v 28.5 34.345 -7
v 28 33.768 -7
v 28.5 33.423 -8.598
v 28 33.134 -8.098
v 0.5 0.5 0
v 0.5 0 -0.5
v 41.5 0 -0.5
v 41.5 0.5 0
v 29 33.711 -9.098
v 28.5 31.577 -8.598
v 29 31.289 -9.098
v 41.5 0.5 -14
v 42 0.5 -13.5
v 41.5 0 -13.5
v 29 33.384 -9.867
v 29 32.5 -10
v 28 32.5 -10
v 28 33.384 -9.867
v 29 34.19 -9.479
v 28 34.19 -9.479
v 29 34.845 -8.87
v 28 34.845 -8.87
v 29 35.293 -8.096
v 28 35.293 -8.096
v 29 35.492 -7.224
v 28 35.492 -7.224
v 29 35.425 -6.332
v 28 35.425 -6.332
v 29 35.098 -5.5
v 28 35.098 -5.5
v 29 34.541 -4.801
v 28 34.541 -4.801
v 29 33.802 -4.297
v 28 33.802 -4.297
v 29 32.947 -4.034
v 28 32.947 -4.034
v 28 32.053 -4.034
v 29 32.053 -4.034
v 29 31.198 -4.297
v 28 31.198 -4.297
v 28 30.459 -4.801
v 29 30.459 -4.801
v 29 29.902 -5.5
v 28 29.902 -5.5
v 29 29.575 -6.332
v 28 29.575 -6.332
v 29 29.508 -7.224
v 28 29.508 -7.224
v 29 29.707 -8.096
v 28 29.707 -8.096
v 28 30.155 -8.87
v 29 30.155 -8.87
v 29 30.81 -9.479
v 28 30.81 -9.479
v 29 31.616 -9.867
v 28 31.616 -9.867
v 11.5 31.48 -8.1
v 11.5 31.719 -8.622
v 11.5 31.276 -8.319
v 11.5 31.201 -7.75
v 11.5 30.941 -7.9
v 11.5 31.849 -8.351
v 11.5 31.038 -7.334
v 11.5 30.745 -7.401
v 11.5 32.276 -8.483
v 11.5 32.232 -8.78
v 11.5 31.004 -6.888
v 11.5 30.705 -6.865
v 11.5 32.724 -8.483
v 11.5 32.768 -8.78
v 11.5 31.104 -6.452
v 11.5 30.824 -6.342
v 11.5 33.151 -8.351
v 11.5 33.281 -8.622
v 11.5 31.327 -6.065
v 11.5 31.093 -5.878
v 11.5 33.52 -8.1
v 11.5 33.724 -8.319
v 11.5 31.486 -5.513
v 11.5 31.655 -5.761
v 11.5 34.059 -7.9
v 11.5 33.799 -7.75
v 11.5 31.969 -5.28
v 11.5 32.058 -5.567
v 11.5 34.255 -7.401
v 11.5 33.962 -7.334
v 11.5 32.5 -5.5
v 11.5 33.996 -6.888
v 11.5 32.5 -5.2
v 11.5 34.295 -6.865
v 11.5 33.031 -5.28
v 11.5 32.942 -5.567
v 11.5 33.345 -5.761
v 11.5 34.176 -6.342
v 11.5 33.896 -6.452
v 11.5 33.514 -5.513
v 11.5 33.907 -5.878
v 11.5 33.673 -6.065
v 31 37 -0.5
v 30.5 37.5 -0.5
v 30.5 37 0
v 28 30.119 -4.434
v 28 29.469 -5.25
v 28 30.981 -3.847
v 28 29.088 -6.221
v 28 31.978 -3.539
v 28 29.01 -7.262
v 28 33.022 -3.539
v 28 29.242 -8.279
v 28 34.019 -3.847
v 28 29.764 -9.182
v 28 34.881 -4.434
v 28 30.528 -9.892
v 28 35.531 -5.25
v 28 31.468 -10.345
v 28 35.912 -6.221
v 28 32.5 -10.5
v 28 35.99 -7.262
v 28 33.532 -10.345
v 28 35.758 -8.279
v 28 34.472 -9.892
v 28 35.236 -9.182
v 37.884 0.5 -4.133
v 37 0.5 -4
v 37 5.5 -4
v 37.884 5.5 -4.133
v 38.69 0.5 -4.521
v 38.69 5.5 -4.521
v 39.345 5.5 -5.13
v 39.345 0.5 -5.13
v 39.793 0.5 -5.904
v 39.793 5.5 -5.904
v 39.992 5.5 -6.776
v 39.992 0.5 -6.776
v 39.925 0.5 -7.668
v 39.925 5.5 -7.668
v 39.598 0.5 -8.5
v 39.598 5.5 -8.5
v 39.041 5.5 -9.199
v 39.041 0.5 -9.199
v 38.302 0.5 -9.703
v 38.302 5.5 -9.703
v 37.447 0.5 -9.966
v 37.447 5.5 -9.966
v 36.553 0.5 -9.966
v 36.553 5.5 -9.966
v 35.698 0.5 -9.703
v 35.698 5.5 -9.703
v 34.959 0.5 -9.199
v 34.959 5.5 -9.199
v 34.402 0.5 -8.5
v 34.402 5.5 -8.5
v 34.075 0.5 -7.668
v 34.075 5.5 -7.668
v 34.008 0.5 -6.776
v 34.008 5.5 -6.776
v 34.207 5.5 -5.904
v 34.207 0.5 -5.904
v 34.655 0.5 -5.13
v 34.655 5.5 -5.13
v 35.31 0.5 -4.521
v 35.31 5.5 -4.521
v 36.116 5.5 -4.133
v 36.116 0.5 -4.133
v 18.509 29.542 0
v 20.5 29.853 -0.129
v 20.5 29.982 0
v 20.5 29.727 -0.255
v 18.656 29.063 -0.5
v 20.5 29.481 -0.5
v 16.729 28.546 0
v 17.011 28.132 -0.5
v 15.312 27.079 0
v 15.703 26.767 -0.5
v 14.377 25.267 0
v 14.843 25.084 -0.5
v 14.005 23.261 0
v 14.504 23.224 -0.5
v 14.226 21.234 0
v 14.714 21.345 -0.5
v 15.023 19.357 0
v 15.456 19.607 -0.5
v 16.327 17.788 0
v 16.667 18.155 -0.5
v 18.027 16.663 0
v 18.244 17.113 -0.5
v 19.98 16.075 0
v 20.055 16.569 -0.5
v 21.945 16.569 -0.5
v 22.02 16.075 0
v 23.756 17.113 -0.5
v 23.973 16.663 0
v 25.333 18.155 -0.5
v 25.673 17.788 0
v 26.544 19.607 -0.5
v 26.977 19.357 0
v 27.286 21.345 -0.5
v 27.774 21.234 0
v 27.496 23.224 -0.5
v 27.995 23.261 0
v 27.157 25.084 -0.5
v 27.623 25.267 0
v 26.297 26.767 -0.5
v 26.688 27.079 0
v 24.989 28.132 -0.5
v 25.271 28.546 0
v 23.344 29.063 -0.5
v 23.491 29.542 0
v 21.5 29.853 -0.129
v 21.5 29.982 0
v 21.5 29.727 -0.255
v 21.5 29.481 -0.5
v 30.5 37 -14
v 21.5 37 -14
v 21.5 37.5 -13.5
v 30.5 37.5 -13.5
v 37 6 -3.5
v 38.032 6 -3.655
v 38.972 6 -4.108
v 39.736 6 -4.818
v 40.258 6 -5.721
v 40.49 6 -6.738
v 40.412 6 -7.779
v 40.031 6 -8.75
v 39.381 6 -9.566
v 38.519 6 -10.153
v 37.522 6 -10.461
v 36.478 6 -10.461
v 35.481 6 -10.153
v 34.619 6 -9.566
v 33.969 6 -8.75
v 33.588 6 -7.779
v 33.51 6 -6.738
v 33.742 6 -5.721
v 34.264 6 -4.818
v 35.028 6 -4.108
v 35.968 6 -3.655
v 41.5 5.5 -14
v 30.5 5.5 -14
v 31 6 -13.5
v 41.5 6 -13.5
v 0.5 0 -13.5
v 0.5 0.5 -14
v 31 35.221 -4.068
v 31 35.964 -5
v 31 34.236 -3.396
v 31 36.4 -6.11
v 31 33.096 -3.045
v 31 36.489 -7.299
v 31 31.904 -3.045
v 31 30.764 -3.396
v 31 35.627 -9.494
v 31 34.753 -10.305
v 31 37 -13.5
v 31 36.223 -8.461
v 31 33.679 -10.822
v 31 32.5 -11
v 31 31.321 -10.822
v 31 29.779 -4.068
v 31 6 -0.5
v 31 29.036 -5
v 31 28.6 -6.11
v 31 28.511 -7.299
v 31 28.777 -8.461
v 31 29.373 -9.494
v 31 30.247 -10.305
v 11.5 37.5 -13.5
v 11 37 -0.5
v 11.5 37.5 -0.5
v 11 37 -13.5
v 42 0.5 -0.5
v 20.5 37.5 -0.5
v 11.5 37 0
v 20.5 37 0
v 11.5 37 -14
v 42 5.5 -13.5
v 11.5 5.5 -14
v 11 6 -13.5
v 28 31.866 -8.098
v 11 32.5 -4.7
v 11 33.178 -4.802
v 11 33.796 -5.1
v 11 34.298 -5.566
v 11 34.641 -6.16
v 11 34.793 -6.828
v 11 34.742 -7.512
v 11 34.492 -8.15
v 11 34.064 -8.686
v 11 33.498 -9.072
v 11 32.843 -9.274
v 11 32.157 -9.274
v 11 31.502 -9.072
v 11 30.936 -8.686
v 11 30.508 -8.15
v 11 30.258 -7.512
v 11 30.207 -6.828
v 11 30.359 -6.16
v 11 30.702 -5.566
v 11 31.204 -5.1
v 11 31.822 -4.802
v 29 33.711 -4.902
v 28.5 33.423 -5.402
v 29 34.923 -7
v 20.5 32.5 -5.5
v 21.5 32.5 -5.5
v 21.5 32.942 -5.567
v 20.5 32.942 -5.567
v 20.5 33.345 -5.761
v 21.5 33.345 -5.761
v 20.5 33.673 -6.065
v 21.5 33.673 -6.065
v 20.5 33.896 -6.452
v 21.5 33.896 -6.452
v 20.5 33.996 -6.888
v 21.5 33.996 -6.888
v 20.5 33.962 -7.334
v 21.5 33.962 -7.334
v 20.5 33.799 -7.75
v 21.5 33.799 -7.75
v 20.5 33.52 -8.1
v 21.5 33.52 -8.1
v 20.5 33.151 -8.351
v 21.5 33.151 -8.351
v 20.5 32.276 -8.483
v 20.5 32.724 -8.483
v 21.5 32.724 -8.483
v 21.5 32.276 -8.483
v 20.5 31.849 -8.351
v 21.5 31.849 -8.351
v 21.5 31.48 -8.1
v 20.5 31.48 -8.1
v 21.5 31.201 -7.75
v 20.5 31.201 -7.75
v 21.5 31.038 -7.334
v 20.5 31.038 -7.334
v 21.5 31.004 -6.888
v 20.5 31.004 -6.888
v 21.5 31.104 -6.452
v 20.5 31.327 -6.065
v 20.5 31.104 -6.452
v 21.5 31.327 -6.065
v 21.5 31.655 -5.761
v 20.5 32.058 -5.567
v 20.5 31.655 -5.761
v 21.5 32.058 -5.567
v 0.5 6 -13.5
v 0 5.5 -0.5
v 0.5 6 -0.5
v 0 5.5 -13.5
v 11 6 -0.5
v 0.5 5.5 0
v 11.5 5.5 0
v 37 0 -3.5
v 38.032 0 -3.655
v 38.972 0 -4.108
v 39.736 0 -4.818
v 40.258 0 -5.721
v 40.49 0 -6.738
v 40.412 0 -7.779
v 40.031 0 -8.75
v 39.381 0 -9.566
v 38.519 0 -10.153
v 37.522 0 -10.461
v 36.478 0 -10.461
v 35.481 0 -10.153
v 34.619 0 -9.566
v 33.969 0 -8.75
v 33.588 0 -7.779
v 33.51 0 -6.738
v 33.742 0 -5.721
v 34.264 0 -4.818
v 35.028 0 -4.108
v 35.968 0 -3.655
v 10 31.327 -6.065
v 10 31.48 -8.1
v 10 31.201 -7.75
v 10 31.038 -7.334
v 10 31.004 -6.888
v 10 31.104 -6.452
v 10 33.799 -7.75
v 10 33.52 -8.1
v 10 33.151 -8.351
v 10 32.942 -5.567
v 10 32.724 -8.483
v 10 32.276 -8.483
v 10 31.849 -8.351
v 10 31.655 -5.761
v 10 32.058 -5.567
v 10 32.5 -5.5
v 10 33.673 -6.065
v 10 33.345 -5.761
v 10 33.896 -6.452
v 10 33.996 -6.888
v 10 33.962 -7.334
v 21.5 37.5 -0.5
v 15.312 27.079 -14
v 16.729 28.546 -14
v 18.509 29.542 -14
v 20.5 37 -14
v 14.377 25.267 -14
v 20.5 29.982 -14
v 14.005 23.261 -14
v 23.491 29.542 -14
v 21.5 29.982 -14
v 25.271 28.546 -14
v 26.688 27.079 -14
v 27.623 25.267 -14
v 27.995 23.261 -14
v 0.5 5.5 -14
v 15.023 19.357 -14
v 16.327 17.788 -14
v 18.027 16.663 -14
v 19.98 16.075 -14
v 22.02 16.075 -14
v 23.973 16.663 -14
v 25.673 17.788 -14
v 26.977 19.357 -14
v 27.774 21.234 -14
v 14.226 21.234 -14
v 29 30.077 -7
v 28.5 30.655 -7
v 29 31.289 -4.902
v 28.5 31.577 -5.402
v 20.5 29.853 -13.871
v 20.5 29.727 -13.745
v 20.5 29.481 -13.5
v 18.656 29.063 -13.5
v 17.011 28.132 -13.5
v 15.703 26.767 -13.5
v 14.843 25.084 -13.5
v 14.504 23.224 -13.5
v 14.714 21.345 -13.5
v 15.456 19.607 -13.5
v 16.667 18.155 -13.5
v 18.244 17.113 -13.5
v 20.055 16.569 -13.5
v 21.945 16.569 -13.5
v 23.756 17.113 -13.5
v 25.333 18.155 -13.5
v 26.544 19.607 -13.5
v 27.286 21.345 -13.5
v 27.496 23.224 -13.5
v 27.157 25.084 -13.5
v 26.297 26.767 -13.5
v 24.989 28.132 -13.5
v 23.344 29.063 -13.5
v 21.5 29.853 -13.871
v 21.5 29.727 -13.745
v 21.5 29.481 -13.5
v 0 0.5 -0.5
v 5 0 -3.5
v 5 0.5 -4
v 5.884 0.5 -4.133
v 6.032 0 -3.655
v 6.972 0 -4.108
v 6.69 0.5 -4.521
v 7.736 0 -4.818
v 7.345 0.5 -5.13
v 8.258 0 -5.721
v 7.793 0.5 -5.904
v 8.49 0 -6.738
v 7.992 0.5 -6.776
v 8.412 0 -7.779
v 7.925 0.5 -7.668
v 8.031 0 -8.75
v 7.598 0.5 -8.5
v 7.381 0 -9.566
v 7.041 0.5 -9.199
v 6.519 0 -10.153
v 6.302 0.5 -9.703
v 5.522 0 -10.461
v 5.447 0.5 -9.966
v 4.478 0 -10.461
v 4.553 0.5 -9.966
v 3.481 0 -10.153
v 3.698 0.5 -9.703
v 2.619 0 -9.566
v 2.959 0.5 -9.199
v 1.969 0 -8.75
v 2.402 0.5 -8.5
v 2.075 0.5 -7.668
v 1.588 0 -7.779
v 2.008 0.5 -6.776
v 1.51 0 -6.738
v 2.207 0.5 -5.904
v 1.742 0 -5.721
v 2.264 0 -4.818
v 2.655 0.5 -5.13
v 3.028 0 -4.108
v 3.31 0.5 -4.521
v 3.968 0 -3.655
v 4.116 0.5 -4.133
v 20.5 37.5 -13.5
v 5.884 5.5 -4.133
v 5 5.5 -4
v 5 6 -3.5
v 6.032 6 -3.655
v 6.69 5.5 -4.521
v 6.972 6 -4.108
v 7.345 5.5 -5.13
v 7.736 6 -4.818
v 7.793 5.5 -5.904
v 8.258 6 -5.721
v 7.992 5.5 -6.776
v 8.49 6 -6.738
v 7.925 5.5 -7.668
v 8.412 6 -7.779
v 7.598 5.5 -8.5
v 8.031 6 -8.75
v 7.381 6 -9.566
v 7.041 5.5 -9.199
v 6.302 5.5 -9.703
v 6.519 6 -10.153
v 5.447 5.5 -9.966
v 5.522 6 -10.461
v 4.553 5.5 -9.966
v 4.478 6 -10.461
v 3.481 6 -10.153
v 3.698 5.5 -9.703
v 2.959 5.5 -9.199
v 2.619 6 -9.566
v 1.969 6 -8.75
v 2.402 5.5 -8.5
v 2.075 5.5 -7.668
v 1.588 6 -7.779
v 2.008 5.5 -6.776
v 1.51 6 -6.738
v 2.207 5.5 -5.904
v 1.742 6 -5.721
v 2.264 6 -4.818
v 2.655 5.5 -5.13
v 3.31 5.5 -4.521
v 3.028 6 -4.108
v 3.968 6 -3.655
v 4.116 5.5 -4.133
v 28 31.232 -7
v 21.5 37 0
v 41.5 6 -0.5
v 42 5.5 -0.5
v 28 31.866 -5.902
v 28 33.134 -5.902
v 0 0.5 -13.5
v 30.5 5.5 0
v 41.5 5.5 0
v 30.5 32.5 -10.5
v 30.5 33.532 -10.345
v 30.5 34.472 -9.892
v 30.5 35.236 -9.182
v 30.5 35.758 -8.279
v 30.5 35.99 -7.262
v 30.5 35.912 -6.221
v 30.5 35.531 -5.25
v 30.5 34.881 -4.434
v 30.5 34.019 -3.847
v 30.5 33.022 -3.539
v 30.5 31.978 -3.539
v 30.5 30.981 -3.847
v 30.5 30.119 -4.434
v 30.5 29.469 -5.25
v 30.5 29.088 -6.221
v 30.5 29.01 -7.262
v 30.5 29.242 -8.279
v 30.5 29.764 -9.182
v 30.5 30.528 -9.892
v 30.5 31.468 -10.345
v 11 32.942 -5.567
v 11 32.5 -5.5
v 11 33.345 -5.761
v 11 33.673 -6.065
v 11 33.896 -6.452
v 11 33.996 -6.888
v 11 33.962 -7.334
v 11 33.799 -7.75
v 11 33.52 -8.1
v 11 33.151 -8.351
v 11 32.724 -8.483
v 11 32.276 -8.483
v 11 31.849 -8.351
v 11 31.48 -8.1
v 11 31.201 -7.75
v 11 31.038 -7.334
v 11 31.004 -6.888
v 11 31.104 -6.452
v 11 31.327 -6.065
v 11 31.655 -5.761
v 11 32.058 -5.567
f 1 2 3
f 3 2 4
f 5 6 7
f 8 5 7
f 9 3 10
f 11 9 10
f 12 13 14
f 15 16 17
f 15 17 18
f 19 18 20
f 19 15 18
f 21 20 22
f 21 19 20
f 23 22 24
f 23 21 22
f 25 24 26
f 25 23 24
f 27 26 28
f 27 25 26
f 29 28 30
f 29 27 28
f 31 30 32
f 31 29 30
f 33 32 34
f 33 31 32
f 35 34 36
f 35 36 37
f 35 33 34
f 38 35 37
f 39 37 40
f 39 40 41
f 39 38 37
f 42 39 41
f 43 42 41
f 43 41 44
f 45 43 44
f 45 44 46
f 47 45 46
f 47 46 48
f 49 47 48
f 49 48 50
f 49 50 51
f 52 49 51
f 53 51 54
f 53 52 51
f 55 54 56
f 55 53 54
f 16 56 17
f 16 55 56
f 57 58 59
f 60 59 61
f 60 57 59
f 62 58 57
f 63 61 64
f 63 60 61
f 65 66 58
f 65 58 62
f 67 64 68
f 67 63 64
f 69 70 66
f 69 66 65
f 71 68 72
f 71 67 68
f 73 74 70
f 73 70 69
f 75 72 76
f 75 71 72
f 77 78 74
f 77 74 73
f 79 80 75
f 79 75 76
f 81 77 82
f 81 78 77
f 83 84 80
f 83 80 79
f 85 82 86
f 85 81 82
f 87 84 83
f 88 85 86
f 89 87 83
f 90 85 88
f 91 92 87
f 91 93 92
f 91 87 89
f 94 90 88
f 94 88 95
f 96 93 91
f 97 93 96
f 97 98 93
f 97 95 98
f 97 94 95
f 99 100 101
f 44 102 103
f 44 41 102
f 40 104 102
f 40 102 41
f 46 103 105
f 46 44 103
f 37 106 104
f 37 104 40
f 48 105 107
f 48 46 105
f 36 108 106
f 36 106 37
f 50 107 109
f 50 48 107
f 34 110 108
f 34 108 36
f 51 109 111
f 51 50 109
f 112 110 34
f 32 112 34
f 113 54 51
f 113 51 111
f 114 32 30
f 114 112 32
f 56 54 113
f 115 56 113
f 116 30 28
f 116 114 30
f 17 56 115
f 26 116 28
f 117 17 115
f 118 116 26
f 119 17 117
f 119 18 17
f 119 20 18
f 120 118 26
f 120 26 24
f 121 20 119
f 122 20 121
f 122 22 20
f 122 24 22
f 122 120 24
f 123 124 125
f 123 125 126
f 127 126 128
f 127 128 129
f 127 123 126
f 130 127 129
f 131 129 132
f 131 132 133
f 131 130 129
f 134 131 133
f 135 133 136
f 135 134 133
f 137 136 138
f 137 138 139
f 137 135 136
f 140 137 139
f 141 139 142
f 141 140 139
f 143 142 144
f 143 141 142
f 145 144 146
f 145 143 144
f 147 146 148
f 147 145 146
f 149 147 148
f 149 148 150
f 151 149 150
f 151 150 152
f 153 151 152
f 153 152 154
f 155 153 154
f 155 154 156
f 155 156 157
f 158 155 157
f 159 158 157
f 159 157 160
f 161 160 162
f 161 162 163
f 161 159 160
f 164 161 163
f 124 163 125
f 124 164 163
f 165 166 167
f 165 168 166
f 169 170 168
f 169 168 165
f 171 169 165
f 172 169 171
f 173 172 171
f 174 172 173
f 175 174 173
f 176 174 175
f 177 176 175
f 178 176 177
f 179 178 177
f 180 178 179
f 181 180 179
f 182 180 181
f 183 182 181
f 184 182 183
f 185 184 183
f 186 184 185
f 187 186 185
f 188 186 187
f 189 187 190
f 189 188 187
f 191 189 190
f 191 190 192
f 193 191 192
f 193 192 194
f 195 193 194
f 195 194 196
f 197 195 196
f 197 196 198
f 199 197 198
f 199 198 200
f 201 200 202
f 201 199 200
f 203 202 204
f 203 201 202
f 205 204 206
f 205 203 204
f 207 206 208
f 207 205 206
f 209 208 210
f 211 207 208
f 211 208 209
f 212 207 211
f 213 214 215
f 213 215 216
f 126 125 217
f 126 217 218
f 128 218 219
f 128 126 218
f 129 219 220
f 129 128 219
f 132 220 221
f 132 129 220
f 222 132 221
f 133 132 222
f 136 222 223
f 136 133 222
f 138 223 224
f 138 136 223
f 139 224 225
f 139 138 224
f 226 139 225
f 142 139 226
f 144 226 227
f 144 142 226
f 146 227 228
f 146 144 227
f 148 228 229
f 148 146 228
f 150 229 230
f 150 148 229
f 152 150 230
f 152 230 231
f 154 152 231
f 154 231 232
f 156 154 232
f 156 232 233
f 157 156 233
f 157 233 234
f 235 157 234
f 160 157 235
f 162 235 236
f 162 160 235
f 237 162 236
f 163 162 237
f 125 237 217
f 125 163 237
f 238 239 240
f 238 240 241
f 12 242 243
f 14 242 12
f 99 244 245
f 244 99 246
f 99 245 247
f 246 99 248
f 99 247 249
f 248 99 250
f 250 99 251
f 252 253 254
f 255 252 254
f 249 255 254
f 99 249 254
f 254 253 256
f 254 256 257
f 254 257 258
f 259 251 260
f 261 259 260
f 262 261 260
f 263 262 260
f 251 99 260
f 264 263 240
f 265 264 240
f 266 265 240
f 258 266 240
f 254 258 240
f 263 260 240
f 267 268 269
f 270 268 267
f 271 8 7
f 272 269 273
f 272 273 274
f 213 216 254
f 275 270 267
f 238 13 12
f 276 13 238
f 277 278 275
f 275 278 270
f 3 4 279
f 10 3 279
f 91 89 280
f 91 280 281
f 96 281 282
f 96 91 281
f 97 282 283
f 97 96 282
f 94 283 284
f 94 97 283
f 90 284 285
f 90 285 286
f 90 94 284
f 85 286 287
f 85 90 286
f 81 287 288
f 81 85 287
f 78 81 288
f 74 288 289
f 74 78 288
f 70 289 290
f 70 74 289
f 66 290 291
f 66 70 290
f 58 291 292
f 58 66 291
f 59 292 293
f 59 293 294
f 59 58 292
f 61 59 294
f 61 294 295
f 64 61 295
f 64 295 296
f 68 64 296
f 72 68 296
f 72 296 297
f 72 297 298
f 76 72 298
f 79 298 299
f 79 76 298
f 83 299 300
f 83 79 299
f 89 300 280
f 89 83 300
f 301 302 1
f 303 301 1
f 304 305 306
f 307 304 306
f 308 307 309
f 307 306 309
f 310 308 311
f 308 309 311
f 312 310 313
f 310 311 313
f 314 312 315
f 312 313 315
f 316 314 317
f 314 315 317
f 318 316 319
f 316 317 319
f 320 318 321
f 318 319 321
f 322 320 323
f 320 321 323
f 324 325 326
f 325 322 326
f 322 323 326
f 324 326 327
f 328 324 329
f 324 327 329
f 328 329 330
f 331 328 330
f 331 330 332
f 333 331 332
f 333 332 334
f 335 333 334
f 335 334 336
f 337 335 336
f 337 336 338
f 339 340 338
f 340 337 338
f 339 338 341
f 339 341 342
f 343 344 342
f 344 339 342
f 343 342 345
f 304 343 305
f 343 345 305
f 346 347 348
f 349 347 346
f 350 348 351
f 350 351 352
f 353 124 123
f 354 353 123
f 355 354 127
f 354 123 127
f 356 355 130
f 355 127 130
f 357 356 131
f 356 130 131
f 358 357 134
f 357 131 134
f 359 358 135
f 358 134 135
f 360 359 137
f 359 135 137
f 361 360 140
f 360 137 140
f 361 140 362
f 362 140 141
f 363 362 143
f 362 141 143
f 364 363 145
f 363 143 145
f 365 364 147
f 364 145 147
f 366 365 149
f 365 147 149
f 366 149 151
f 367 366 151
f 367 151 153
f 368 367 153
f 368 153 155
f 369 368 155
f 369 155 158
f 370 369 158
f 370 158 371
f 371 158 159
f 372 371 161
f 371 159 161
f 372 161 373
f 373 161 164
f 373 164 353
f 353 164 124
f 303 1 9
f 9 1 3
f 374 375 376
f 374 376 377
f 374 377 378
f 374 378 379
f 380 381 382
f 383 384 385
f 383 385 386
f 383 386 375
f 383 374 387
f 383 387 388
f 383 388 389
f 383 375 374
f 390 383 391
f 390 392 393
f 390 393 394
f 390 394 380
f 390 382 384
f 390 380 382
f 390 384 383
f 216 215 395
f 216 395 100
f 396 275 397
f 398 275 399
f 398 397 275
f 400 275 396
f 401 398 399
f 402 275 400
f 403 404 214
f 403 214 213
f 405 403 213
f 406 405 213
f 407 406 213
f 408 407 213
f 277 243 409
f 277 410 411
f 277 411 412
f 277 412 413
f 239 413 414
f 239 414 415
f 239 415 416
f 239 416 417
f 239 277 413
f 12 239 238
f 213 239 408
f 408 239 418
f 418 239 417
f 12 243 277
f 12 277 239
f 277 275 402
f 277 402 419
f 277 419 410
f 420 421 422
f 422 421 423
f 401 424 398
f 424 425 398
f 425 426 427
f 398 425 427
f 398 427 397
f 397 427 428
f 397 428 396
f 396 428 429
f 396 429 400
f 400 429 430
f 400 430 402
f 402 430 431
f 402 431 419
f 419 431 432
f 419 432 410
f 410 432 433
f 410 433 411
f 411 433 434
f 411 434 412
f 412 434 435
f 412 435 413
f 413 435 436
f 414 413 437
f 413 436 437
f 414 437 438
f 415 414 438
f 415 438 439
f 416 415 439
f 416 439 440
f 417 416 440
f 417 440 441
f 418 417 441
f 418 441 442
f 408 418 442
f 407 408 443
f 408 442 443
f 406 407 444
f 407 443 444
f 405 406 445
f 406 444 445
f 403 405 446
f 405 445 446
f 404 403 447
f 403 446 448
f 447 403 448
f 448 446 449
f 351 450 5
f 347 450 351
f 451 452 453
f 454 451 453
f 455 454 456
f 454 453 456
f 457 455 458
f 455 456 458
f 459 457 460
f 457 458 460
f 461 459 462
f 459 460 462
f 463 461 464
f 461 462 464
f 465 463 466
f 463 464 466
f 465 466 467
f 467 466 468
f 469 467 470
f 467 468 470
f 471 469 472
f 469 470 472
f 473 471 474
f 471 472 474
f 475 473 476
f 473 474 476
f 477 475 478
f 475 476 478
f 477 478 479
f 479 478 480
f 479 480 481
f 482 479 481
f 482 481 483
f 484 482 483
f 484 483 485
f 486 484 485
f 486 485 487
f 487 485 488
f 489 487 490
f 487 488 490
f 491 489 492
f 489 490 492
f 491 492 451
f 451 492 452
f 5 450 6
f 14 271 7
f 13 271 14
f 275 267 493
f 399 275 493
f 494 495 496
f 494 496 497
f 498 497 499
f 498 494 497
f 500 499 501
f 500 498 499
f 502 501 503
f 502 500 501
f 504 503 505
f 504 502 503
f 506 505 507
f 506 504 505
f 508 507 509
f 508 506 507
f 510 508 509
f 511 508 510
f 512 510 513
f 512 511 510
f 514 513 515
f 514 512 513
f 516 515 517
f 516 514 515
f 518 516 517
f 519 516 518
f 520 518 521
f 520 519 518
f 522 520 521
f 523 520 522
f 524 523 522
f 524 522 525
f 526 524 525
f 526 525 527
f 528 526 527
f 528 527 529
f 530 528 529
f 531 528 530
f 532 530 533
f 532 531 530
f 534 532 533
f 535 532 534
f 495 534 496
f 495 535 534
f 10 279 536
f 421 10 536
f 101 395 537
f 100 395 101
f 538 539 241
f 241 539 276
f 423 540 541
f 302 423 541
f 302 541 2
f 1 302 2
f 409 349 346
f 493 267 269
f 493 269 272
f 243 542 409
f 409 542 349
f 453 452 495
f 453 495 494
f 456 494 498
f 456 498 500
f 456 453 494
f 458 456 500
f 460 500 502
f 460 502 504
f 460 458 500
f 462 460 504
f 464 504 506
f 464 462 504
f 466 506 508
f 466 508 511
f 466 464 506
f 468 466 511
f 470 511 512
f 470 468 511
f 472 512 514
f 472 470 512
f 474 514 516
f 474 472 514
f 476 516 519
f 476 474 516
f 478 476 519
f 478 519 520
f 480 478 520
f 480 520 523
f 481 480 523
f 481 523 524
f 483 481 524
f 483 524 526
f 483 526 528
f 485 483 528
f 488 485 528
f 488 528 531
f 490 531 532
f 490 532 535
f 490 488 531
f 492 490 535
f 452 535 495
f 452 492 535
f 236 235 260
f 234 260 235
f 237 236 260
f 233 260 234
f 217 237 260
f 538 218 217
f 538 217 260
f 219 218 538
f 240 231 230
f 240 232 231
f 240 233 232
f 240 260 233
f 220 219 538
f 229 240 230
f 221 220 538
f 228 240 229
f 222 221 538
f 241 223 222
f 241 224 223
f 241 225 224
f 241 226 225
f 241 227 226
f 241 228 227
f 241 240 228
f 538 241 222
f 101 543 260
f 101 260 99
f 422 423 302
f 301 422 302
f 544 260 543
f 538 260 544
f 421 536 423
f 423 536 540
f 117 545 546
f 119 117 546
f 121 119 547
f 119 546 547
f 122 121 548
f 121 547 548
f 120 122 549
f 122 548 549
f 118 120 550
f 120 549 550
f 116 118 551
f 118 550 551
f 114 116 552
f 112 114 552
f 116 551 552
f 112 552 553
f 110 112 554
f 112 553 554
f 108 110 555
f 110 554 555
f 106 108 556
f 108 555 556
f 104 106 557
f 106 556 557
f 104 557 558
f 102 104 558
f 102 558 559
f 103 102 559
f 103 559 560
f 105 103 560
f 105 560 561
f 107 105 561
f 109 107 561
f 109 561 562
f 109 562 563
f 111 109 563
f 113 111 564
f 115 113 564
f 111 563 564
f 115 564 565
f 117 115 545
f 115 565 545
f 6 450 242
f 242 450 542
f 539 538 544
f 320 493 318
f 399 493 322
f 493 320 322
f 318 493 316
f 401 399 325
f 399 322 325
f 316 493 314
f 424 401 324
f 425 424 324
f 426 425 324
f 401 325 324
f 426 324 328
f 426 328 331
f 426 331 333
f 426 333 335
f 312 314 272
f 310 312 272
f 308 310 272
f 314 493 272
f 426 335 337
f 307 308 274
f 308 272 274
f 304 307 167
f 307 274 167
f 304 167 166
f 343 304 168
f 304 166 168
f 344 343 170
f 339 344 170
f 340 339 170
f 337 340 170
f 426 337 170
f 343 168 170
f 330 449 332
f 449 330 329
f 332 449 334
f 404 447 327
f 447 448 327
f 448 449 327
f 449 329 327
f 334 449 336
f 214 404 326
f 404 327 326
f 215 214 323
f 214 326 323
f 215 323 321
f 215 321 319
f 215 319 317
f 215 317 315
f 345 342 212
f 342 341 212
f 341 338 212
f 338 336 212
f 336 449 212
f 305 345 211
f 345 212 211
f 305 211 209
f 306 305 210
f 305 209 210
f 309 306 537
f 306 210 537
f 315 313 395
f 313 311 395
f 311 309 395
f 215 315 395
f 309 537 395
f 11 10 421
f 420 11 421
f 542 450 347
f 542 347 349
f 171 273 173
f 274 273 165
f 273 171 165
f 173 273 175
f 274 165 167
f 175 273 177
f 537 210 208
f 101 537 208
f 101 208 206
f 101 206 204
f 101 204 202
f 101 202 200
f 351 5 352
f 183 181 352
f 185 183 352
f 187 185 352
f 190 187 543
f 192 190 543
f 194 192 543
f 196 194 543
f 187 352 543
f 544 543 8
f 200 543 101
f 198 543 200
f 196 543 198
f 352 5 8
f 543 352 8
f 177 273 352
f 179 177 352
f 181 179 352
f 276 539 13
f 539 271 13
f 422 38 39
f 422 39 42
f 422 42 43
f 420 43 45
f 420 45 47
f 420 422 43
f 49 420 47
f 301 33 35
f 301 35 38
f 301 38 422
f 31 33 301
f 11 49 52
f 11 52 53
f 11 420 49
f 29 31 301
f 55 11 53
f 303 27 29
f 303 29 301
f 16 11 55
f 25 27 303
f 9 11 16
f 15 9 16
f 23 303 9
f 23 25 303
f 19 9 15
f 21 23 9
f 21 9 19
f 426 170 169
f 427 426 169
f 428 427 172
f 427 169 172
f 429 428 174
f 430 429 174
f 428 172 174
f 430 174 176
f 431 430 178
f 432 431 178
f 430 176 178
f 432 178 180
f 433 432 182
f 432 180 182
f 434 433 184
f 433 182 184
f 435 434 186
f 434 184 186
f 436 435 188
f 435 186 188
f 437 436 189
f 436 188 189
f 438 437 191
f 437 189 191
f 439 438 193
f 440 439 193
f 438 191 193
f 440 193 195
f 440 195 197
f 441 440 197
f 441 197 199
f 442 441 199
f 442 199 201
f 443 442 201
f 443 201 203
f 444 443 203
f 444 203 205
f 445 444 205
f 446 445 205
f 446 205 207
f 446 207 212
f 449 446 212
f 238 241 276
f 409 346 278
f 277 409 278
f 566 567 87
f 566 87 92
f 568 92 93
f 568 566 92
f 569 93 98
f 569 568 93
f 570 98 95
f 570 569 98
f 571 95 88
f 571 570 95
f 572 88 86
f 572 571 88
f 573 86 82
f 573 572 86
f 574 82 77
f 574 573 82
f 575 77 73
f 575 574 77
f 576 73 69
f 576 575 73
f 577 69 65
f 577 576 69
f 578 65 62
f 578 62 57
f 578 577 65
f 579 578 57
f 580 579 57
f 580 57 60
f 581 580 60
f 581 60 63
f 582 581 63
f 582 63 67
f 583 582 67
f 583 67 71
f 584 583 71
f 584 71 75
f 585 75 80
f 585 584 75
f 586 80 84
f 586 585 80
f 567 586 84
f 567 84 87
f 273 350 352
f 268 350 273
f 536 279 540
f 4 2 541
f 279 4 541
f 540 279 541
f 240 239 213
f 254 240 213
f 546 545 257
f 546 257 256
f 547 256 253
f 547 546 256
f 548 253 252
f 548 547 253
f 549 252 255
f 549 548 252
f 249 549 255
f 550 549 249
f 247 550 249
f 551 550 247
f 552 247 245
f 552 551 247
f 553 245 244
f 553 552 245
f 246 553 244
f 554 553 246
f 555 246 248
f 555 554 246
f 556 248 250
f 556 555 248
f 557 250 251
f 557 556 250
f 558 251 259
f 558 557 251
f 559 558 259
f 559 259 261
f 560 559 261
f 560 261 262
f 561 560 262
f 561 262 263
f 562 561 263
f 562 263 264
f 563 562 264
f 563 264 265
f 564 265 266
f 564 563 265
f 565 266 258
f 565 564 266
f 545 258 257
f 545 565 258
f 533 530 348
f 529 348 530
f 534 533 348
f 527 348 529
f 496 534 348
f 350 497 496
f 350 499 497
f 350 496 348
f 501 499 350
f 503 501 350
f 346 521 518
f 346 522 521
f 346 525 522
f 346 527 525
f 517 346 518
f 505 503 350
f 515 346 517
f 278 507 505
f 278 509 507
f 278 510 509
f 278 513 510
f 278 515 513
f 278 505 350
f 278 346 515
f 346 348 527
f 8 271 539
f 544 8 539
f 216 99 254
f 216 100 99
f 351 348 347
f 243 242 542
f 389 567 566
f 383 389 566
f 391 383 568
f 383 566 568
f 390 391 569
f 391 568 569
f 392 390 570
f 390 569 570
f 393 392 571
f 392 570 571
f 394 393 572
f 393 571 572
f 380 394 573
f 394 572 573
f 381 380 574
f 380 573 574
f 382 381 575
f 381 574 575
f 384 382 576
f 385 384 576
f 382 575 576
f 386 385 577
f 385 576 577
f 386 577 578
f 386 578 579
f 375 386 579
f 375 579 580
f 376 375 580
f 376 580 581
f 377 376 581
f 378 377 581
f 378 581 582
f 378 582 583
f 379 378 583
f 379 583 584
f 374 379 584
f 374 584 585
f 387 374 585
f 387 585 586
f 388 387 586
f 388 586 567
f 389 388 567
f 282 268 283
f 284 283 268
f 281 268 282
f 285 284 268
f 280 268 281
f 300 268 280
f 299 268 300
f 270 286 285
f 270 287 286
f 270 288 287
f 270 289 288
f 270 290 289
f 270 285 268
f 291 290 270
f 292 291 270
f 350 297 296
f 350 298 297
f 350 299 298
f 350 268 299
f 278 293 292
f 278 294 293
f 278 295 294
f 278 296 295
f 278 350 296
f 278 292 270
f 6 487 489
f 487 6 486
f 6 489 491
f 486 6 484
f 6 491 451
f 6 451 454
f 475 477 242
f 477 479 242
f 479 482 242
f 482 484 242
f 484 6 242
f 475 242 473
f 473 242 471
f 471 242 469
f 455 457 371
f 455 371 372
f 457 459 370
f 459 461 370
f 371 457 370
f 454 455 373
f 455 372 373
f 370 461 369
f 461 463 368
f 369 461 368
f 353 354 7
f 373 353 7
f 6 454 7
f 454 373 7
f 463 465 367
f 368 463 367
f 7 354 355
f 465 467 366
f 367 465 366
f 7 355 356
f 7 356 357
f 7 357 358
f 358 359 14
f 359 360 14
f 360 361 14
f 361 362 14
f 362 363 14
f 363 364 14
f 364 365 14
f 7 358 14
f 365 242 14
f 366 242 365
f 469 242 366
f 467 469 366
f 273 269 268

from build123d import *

# Parameters (mm, degrees)
SKETCH_1_W           = 42
SKETCH_1_H           = 14
SKETCH_1_R           = 3
EXTRUDE_1_DEPTH      = 6
SKETCH_2_W           = 20
SKETCH_2_H           = 14
EXTRUDE_2_DEPTH      = 31.5
CUT_EXTRUDE_1_DEPTH  = 37.5
SKETCH_5_R           = 3.5
CUT_EXTRUDE_2_DEPTH  = 2
SKETCH_6_R           = 3.5
SKETCH_6_R_2         = 3
CUT_EXTRUDE_3_DEPTH  = 1
EXTRUDE_3_DEPTH      = 1
EXTRUDE_3_DEPTH_BACK = 15
SKETCH_7_R           = 1.5
SKETCH_8_R           = 1.8
SKETCH_8_R_2         = 1.5
CUT_EXTRUDE_4_DEPTH  = 0.5
CHAMFER_1_SIZE       = 0.5
CHAMFER_2_SIZE       = 0.5
CHAMFER_3_SIZE       = 0.5
CHAMFER_4_SIZE       = 0.5


with BuildPart() as part:
    # 草图1 → 凸台-拉伸1 (new body)
    with BuildSketch(Plane(origin=(0, 0, 0), x_dir=(1, 0, 0), z_dir=(0, 1, 0))):
        with Locations((21, 7)):
            Rectangle(SKETCH_1_W, SKETCH_1_H)
        with Locations(Location((5, 7, 0), (0, 0, 270))):
            Circle(SKETCH_1_R, mode=Mode.SUBTRACT)
        with Locations(Location((37, 7, 0), (0, 0, 270))):
            Circle(SKETCH_1_R, mode=Mode.SUBTRACT)
    extrude(amount=EXTRUDE_1_DEPTH)

    # 草图2 → 凸台-拉伸2 (add)
    with BuildSketch(Plane(origin=(0, 6, 0), x_dir=(1, 0, 0), z_dir=(0, 1, 0))):
        with Locations((21, 7)):
            Rectangle(SKETCH_2_W, SKETCH_2_H)
    extrude(amount=EXTRUDE_2_DEPTH)

    # 草图3 → 切除-拉伸1 (cut)
    with BuildSketch(Plane.XY):
        with BuildLine():
            Line((21.5, 29.480740698), (21.5, 37.5))
            Line((21.5, 37.5), (20.5, 37.5))
            Line((20.5, 37.5), (20.5, 29.480740698))
            ThreePointArc((20.5, 29.480740698), (21, 16.5), (21.5, 29.480740698))
        make_face()
    extrude(amount=-CUT_EXTRUDE_1_DEPTH, mode=Mode.SUBTRACT)

    # 草图5 → 切除-拉伸2 (cut)
    with BuildSketch(Plane(origin=(31, 0, 0), x_dir=(0, 0, -1), z_dir=(1, 0, 0))):
        with Locations((7, 32.5)):
            Circle(SKETCH_5_R)
    extrude(amount=-CUT_EXTRUDE_2_DEPTH, mode=Mode.SUBTRACT)

    # 草图6 → 切除-拉伸3 (cut)
    # profile 1 of 2: a face of its own
    with BuildSketch(Plane(origin=(29, 0, 0), x_dir=(0, 0, -1), z_dir=(1, 0, 0))):
        with Locations((7, 32.5)):
            Circle(SKETCH_6_R)
        with Locations((7, 32.5)):
            Circle(SKETCH_6_R_2, mode=Mode.SUBTRACT)
    # profile 2 of 2: a face of its own
    with BuildSketch(Plane(origin=(29, 0, 0), x_dir=(0, 0, -1), z_dir=(1, 0, 0))):
        Polygon((5.401923789, 31.577350269), (5.401923789, 33.422649731), (7, 34.345299462), (8.598076211, 33.422649731), (8.598076211, 31.577350269), (7, 30.654700538), align=None)
    extrude(amount=-CUT_EXTRUDE_3_DEPTH, mode=Mode.SUBTRACT)

    # 草图7 → 凸台-拉伸3 (add, two sides: drawn at the far end of the back side and taken through both)
    with BuildSketch(Plane.ZY.offset(-11).offset(-EXTRUDE_3_DEPTH_BACK)):
        with Locations((-7, 32.5)):
            Circle(SKETCH_7_R)
    extrude(amount=EXTRUDE_3_DEPTH + EXTRUDE_3_DEPTH_BACK)

    # 草图8 → 切除-拉伸4 (cut)
    with BuildSketch(Plane.ZY.offset(-11)):
        with Locations((-7, 32.5)):
            Circle(SKETCH_8_R)
        with Locations((-7, 32.5)):
            Circle(SKETCH_8_R_2, mode=Mode.SUBTRACT)
    extrude(amount=-CUT_EXTRUDE_4_DEPTH, mode=Mode.SUBTRACT)

    # 倒角1
    chamfer_1_edges = [part.edges().sort_by_distance(p)[0] for p in [
        (11, 32.5, -8.8),
    ]]
    chamfer(chamfer_1_edges, length=CHAMFER_1_SIZE - 0.0001)  # a hair under: the kernel refuses the full size

    # 倒角2
    chamfer_2_edges = [part.edges().sort_by_distance(p)[0] for p in [
        (31, 32.5, -3.5),
    ]]
    chamfer(chamfer_2_edges, length=CHAMFER_2_SIZE)

    # 倒角3
    chamfer_3_edges = [part.edges().sort_by_distance(p)[0] for p in [
        (29, 31.116025404, -7.799038106),
        (29, 32.5, -8.598076211),
        (29, 33.883974596, -7.799038106),
        (29, 33.883974596, -6.200961894),
        (29, 32.5, -5.401923789),
        (29, 31.116025404, -6.200961894),
        (28, 33.883974596, -6.200961894),
        (28, 33.883974596, -7.799038106),
        (28, 32.5, -8.598076211),
        (28, 31.116025404, -7.799038106),
        (28, 31.116025404, -6.200961894),
        (28, 32.5, -5.401923789),
    ]]
    chamfer(chamfer_3_edges, length=CHAMFER_3_SIZE - 0.0001)  # a hair under: the kernel refuses the full size

    # 倒角4
    chamfer_4_edges = [part.edges().sort_by_distance(p)[0] for p in [
        (21, 16.5, 0),
        (21, 16.5, -14),
        (0, 0, -7),
        (0, 6, -7),
        (11, 37.5, -7),
        (31, 37.5, -7),
        (42, 6, -7),
        (15.75, 37.5, 0),
        (11, 21.75, 0),
        (5.5, 6, 0),
        (0, 3, 0),
        (21, 0, 0),
        (26.25, 37.5, 0),
        (31, 21.75, 0),
        (36.5, 6, 0),
        (42, 3, 0),
        (42, 0, -7),
        (26.25, 37.5, -14),
        (31, 21.75, -14),
        (36.5, 6, -14),
        (42, 3, -14),
        (21, 0, -14),
        (0, 3, -14),
        (5.5, 6, -14),
        (11, 21.75, -14),
        (15.75, 37.5, -14),
        (37, 0, -10),
        (37, 6, -10),
        (5, 0, -10),
        (5, 6, -10),
    ]]
    chamfer(chamfer_4_edges, length=CHAMFER_4_SIZE)


solid = part.part
